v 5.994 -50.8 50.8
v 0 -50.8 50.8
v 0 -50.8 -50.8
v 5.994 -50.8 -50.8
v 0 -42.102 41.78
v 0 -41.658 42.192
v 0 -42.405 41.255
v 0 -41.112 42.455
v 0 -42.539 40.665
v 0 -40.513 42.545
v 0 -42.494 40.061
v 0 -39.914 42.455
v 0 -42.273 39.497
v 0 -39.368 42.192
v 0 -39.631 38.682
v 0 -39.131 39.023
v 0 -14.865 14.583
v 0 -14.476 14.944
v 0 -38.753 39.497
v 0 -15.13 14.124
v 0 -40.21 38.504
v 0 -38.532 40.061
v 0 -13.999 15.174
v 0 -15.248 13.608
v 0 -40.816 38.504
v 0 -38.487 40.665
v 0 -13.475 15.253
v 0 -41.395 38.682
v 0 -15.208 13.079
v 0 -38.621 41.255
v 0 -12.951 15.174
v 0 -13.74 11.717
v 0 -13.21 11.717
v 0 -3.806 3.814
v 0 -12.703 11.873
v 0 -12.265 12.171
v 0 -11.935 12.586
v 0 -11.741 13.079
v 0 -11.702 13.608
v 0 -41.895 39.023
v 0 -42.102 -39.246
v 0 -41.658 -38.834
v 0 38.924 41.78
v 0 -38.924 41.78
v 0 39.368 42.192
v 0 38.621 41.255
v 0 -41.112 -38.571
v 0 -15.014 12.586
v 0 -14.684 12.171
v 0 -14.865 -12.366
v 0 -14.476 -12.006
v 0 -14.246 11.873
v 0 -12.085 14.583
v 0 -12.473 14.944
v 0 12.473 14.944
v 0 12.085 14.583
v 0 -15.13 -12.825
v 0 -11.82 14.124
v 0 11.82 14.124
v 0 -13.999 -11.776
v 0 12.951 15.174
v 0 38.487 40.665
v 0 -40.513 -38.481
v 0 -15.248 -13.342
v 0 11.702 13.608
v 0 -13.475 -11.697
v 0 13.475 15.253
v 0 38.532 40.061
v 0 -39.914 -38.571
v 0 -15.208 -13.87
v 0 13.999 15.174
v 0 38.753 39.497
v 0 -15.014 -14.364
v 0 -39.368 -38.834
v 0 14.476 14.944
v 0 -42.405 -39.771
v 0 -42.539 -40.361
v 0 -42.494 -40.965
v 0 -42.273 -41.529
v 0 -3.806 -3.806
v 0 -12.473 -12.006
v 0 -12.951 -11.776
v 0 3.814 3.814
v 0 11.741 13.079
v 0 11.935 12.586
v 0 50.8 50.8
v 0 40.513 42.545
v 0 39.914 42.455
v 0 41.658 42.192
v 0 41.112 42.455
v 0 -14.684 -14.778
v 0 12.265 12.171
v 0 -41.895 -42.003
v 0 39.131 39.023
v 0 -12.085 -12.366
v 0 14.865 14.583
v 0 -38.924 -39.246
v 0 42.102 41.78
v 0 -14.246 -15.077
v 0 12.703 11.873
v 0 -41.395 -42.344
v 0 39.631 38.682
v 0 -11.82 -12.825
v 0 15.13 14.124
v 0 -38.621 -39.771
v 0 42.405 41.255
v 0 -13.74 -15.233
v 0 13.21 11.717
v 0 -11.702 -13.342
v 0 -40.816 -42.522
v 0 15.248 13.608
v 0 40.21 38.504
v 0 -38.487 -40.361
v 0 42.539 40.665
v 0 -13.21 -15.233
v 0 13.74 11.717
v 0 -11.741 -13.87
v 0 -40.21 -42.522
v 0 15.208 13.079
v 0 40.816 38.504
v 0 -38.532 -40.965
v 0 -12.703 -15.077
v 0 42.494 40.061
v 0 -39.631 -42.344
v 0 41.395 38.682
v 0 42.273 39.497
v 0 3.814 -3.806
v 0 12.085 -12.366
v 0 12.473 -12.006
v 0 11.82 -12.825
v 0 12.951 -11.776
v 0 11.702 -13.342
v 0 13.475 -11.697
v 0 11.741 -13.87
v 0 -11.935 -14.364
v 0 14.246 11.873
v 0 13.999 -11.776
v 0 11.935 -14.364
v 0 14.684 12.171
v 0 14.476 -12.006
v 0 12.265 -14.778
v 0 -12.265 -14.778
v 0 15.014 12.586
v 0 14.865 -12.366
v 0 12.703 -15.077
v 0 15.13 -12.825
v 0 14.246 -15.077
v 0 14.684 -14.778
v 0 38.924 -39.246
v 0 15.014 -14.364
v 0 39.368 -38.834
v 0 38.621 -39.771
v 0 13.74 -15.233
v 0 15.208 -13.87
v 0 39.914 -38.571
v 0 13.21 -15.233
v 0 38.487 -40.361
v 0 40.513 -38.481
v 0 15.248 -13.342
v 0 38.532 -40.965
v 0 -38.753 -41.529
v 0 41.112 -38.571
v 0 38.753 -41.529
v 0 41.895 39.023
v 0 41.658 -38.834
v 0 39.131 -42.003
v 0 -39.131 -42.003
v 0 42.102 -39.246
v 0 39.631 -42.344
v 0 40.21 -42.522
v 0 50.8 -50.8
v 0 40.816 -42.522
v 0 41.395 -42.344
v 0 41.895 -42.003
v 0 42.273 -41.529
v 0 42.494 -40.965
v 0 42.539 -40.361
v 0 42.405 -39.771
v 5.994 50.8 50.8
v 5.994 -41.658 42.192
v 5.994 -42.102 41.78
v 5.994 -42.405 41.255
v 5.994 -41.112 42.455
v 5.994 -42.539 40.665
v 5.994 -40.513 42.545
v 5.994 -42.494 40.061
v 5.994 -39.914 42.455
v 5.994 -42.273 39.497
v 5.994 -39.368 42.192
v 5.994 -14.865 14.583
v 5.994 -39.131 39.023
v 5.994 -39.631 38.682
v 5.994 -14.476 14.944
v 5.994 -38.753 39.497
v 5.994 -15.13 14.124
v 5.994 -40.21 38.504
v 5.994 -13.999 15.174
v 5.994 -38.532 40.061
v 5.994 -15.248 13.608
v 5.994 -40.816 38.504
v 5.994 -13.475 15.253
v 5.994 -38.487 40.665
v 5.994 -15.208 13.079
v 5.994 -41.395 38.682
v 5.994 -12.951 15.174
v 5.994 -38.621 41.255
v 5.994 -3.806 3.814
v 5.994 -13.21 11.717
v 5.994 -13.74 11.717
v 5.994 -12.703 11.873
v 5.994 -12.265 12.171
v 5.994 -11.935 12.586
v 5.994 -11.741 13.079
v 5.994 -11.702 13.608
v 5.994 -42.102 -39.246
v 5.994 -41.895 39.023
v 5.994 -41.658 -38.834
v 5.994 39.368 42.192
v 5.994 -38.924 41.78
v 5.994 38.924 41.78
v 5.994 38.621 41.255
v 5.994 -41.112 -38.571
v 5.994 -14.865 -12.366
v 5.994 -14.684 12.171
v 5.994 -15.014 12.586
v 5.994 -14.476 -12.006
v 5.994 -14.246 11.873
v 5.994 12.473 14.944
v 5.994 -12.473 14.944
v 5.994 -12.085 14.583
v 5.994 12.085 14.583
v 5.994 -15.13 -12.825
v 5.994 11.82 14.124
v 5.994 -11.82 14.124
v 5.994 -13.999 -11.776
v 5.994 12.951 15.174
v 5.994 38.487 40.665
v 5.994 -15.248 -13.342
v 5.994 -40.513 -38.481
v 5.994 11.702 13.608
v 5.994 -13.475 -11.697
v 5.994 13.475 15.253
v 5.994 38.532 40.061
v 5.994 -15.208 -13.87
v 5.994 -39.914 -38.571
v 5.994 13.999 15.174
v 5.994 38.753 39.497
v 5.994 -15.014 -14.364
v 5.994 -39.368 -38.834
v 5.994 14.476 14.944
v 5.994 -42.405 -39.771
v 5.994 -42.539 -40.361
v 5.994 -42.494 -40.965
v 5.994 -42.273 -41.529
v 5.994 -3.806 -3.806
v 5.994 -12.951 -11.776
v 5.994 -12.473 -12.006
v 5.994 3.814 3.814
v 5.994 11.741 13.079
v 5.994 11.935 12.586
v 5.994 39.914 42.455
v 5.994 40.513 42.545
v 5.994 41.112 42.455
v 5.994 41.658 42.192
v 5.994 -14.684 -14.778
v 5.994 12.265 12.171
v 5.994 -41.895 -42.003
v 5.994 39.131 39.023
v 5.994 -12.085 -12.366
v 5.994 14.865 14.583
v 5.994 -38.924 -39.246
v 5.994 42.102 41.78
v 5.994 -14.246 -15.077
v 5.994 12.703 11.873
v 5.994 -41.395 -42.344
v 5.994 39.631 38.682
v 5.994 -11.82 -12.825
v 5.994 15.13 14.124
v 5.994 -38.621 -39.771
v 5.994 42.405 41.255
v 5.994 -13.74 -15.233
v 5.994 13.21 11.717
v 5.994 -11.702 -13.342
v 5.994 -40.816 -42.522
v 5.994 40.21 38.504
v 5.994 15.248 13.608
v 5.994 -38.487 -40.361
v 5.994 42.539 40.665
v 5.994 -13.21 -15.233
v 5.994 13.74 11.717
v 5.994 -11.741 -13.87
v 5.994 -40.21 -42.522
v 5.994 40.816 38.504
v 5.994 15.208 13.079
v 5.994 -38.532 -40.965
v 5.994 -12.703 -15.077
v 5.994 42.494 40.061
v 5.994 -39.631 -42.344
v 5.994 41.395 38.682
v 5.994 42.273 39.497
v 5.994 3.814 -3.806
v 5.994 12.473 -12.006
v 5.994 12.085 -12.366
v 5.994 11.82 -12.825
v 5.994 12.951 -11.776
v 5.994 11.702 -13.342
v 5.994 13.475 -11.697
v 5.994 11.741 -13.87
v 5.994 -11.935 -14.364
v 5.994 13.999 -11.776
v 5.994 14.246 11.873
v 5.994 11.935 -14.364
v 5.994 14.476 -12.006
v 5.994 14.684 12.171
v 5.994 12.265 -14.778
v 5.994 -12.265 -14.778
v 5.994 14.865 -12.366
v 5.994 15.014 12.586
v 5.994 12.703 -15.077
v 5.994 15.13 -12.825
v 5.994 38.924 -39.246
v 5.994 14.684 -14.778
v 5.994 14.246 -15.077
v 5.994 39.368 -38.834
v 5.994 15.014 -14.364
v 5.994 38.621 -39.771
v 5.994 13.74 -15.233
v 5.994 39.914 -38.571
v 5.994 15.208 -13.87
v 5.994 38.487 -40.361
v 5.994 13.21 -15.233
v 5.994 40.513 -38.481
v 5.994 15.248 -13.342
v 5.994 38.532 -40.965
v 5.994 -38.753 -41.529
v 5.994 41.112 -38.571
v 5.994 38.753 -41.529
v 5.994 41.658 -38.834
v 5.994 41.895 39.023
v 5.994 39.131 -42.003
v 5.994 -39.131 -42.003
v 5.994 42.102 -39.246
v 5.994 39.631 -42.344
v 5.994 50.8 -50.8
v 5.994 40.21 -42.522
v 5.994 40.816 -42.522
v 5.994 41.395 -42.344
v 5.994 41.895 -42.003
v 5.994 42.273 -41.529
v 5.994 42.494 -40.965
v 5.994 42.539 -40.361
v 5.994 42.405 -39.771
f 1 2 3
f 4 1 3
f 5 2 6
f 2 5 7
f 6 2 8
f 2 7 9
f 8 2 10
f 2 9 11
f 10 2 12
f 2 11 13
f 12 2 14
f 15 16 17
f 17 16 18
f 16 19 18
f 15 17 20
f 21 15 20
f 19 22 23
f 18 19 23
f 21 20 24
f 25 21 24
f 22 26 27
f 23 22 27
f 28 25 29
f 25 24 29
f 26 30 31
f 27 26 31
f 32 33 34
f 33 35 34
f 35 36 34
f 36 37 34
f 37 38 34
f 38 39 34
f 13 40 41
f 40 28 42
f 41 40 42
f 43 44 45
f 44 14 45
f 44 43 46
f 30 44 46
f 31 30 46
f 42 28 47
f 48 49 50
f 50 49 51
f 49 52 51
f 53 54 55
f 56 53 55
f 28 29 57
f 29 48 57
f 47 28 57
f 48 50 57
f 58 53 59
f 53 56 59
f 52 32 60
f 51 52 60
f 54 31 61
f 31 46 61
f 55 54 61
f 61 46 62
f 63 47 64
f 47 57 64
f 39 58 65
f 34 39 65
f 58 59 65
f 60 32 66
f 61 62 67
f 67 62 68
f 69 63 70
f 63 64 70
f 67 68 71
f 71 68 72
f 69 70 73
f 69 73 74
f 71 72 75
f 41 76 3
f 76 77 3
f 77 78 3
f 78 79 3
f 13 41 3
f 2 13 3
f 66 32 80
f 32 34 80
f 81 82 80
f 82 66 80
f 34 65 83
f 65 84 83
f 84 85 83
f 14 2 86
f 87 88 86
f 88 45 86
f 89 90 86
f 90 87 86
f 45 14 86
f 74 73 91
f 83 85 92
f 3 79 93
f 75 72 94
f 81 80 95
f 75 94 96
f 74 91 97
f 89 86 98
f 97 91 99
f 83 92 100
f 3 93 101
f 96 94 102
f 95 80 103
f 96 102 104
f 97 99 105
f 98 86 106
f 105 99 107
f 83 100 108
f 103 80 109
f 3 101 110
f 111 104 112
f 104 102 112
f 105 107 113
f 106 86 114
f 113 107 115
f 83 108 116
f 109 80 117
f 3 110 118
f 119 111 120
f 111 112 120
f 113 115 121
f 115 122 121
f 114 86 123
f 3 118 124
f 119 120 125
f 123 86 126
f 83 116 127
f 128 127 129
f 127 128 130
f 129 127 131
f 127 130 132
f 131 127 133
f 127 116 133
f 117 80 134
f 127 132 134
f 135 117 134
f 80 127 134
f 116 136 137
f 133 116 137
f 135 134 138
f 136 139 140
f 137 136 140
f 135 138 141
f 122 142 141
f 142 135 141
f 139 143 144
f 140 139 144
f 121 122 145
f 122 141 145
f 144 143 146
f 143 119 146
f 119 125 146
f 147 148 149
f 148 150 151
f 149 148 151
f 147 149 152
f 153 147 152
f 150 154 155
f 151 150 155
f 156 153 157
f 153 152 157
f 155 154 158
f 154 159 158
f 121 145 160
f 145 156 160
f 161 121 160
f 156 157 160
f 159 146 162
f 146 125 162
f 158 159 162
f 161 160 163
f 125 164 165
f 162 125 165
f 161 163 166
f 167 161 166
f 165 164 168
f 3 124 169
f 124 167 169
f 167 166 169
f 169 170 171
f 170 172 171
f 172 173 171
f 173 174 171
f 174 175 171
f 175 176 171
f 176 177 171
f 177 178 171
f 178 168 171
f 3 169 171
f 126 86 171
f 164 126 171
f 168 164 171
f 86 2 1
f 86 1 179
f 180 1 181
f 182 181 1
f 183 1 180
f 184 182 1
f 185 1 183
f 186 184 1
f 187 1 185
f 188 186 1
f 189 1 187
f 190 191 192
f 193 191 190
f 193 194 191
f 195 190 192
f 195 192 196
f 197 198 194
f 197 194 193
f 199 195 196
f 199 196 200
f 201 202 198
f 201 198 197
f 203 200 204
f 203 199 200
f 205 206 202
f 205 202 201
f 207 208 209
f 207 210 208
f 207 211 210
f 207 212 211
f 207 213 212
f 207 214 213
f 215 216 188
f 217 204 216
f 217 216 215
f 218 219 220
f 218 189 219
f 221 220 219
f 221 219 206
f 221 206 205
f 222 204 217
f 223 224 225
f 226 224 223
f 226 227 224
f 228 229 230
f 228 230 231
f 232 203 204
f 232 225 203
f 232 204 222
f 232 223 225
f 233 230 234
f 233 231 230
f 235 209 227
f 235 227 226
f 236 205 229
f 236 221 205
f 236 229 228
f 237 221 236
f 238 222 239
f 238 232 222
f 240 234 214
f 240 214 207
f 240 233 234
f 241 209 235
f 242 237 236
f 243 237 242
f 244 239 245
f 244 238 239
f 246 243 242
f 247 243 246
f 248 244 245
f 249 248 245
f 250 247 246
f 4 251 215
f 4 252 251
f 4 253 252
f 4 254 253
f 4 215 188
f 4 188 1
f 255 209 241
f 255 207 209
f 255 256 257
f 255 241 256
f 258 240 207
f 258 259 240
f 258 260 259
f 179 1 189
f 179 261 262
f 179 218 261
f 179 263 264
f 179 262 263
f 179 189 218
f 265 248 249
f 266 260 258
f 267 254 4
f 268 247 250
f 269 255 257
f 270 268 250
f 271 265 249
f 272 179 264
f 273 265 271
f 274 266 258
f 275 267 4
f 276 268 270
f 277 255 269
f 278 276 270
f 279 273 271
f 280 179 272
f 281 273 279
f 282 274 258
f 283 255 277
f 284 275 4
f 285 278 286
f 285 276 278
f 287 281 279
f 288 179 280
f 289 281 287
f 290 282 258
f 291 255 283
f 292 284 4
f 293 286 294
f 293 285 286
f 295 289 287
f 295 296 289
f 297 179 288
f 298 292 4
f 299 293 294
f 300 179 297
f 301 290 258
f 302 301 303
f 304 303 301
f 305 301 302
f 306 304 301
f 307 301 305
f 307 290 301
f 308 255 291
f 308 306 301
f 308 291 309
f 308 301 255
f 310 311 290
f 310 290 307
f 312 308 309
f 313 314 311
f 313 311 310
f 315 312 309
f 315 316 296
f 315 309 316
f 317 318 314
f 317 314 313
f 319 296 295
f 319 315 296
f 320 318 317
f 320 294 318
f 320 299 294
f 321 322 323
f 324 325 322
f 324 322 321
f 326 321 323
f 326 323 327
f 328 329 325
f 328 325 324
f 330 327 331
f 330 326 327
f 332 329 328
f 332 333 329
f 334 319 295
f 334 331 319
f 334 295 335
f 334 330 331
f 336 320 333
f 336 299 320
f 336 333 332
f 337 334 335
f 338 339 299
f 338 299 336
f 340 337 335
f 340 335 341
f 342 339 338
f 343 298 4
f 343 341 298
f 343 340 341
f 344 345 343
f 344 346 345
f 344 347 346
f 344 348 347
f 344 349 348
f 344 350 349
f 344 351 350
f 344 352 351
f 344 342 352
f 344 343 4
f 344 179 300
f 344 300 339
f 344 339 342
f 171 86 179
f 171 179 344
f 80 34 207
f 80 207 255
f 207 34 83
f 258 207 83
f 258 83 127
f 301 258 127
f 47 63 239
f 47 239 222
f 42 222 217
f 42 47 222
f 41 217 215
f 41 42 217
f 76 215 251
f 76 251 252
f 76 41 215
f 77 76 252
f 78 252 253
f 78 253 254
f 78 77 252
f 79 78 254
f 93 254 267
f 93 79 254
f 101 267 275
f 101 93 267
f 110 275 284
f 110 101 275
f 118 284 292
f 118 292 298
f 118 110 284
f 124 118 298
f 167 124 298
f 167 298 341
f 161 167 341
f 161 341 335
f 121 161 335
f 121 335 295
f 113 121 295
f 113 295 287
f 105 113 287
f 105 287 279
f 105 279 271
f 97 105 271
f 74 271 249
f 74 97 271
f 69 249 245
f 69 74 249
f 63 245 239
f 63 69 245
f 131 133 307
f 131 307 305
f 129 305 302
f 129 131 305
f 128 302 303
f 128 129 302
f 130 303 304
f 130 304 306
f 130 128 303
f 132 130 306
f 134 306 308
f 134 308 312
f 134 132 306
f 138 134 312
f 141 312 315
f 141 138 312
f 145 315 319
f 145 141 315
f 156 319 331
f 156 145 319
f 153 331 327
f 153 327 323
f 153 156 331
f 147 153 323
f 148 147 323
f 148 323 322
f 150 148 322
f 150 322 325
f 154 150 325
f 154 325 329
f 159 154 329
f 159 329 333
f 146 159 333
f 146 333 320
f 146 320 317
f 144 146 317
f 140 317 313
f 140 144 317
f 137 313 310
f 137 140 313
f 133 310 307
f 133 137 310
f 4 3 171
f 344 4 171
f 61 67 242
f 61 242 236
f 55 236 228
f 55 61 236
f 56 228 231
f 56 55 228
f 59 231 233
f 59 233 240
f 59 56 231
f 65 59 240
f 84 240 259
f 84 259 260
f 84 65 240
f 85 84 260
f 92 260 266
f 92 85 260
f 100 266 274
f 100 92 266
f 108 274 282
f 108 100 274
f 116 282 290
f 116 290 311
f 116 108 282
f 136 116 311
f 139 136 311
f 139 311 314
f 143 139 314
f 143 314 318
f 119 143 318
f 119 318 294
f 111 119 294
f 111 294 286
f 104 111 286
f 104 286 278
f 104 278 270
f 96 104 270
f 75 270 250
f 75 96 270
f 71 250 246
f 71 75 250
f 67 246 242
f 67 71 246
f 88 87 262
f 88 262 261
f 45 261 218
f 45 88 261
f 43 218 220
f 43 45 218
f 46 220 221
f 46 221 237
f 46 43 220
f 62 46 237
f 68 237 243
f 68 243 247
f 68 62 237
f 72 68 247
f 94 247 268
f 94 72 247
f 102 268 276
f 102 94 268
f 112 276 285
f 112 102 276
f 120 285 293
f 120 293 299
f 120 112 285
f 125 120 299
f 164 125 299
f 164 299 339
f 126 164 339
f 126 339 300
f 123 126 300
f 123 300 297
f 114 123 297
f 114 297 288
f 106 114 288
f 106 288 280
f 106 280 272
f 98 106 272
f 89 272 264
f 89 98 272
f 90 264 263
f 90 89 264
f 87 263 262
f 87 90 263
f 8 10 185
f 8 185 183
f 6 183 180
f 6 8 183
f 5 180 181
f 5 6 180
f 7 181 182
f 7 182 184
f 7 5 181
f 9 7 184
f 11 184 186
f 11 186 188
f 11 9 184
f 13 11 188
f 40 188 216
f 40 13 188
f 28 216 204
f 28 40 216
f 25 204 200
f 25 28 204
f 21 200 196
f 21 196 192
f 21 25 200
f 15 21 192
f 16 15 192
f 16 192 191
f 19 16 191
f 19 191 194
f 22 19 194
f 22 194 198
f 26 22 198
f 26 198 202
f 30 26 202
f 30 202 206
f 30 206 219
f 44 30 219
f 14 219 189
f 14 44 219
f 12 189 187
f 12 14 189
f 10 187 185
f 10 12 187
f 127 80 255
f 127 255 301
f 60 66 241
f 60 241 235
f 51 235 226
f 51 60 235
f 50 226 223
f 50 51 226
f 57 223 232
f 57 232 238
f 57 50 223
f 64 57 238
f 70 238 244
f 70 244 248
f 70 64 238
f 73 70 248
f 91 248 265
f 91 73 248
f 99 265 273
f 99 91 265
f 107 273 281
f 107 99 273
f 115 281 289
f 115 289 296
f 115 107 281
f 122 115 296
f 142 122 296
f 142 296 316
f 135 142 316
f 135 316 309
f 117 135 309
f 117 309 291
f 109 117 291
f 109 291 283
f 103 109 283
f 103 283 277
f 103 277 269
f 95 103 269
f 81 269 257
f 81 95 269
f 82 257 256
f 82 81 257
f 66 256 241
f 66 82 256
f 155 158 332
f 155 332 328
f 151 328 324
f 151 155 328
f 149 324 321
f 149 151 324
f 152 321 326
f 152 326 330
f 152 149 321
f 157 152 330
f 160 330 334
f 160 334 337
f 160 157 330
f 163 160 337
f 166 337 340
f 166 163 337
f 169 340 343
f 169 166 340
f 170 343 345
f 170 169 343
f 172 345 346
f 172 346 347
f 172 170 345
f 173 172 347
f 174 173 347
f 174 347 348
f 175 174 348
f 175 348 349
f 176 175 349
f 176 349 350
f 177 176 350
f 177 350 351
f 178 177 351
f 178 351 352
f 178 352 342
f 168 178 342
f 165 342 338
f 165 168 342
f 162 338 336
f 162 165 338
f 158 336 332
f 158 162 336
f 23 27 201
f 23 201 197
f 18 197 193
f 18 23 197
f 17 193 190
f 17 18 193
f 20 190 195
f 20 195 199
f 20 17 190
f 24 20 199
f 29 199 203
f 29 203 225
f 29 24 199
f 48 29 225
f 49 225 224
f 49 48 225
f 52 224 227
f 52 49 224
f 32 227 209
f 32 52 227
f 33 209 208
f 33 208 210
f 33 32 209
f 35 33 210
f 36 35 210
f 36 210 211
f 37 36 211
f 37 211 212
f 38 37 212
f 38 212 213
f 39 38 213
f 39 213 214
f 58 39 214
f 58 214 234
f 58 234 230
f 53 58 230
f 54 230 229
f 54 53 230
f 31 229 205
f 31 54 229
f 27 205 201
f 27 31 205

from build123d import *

# Parameters (mm, degrees)
SKETCH1_W           = 101.599999998
SKETCH1_H           = 101.6
SKETCH1_R           = 2.032
SKETCH1_R_2         = 1.778
SKETCH1_W_2         = 7.62
SKETCH1_H_2         = 7.62
BOSS_EXTRUDE1_DEPTH = 5.9944


with BuildPart() as part:
    # Sketch1 → Boss-Extrude1 (new body)
    with BuildSketch(Plane(origin=(0, 0, 0), x_dir=(0, 0, -1), z_dir=(1, 0, 0))):
        Rectangle(SKETCH1_W, SKETCH1_H)
        with Locations(Location((-40.513, 40.513, 0), (0, 0, 180))):
            Circle(SKETCH1_R, mode=Mode.SUBTRACT)
        with Locations(Location((40.513, 40.513, 0), (0, 0, 180))):
            Circle(SKETCH1_R, mode=Mode.SUBTRACT)
        with Locations(Location((40.513, -40.513, 0), (0, 0, 180))):
            Circle(SKETCH1_R, mode=Mode.SUBTRACT)
        with Locations(Location((-40.513, -40.513, 0), (0, 0, 180))):
            Circle(SKETCH1_R, mode=Mode.SUBTRACT)
        with Locations(Location((-13.4747, 13.4747, 0), (0, 0, 180))):
            Circle(SKETCH1_R_2, mode=Mode.SUBTRACT)
        with Locations(Location((-13.4747, -13.4747, 0), (0, 0, 180))):
            Circle(SKETCH1_R_2, mode=Mode.SUBTRACT)
        with Locations(Location((13.4747, -13.4747, 0), (0, 0, 180))):
            Circle(SKETCH1_R_2, mode=Mode.SUBTRACT)
        with Locations(Location((13.4747, 13.4747, 0), (0, 0, 180))):
            Circle(SKETCH1_R_2, mode=Mode.SUBTRACT)
        with Locations((-0.004315818, 0.004315818)):
            Rectangle(SKETCH1_W_2, SKETCH1_H_2, mode=Mode.SUBTRACT)
    extrude(amount=BOSS_EXTRUDE1_DEPTH)


solid = part.part
